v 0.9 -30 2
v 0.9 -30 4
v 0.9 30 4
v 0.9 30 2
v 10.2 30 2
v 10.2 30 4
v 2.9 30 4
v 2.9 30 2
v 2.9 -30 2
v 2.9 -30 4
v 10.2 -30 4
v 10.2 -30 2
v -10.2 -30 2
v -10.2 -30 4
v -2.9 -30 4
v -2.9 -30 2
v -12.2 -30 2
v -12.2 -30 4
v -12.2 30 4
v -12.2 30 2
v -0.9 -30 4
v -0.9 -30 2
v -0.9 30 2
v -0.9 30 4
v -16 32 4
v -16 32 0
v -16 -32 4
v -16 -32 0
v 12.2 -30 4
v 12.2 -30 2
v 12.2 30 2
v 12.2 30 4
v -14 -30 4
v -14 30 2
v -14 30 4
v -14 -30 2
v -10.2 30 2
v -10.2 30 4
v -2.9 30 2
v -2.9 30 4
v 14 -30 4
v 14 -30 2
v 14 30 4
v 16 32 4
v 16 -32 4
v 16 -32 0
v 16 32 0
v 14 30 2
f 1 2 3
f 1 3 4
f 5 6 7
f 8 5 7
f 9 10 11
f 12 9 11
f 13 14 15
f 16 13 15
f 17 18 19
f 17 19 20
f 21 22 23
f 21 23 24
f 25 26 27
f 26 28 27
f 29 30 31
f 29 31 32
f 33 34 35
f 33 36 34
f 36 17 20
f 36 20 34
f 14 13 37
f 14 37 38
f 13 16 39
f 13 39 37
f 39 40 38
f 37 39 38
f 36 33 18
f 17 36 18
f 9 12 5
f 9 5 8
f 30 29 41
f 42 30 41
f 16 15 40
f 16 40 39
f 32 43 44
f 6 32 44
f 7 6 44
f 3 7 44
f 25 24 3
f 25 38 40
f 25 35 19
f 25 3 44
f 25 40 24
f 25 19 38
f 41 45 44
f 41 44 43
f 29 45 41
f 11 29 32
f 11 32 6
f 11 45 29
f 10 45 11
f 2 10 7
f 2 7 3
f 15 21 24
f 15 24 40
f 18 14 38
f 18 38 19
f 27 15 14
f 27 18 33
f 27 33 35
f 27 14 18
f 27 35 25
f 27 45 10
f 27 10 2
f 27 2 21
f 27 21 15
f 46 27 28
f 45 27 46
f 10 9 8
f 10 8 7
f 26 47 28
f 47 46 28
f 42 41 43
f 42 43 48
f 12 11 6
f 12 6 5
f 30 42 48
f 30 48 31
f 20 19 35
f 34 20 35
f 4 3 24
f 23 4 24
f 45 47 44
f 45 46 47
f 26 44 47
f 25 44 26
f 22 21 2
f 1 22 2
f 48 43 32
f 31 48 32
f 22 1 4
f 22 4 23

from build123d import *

# Parameters (mm, degrees)
F1_DEPTH      = 30
F1_DEPTH_BACK = 30
F2_W          = 32
F2_H          = 4
F3_DEPTH      = 2
F4_W          = 32
F4_H          = 4
F5_DEPTH      = 2


with BuildPart() as f1:
    # F0 (on Front) → F1 (new body, two sides)
    with BuildSketch(Plane.XZ) as f1_sk:
        Polygon((-16, 4), (-16, 0), (16, 0), (16, 4), (14, 4), (14, 2), (12.2, 2), (12.2, 4), (10.2, 4), (10.2, 2), (2.9, 2), (2.9, 4), (0.9, 4), (0.9, 2), (-0.9, 2), (-0.9, 4), (-2.9, 4), (-2.9, 2), (-10.2, 2), (-10.2, 4), (-12.2, 4), (-12.2, 2), (-14, 2), (-14, 4), align=None)
    extrude(amount=F1_DEPTH)
    extrude(f1_sk.sketch, amount=-F1_DEPTH_BACK)

    # F2 (on face) → F3 (join)
    with BuildSketch(Plane.XZ.offset(30)):
        with Locations((0, 2)):
            Rectangle(F2_W, F2_H)
    extrude(amount=F3_DEPTH)

    # F4 (on face) → F5 (join)
    with BuildSketch(Plane(origin=(0, 30, 0), x_dir=(-1, 0, 0), z_dir=(0, 1, 0))):
        with Locations((0, 2)):
            Rectangle(F4_W, F4_H)
    extrude(amount=F5_DEPTH)


solid = f1.part
